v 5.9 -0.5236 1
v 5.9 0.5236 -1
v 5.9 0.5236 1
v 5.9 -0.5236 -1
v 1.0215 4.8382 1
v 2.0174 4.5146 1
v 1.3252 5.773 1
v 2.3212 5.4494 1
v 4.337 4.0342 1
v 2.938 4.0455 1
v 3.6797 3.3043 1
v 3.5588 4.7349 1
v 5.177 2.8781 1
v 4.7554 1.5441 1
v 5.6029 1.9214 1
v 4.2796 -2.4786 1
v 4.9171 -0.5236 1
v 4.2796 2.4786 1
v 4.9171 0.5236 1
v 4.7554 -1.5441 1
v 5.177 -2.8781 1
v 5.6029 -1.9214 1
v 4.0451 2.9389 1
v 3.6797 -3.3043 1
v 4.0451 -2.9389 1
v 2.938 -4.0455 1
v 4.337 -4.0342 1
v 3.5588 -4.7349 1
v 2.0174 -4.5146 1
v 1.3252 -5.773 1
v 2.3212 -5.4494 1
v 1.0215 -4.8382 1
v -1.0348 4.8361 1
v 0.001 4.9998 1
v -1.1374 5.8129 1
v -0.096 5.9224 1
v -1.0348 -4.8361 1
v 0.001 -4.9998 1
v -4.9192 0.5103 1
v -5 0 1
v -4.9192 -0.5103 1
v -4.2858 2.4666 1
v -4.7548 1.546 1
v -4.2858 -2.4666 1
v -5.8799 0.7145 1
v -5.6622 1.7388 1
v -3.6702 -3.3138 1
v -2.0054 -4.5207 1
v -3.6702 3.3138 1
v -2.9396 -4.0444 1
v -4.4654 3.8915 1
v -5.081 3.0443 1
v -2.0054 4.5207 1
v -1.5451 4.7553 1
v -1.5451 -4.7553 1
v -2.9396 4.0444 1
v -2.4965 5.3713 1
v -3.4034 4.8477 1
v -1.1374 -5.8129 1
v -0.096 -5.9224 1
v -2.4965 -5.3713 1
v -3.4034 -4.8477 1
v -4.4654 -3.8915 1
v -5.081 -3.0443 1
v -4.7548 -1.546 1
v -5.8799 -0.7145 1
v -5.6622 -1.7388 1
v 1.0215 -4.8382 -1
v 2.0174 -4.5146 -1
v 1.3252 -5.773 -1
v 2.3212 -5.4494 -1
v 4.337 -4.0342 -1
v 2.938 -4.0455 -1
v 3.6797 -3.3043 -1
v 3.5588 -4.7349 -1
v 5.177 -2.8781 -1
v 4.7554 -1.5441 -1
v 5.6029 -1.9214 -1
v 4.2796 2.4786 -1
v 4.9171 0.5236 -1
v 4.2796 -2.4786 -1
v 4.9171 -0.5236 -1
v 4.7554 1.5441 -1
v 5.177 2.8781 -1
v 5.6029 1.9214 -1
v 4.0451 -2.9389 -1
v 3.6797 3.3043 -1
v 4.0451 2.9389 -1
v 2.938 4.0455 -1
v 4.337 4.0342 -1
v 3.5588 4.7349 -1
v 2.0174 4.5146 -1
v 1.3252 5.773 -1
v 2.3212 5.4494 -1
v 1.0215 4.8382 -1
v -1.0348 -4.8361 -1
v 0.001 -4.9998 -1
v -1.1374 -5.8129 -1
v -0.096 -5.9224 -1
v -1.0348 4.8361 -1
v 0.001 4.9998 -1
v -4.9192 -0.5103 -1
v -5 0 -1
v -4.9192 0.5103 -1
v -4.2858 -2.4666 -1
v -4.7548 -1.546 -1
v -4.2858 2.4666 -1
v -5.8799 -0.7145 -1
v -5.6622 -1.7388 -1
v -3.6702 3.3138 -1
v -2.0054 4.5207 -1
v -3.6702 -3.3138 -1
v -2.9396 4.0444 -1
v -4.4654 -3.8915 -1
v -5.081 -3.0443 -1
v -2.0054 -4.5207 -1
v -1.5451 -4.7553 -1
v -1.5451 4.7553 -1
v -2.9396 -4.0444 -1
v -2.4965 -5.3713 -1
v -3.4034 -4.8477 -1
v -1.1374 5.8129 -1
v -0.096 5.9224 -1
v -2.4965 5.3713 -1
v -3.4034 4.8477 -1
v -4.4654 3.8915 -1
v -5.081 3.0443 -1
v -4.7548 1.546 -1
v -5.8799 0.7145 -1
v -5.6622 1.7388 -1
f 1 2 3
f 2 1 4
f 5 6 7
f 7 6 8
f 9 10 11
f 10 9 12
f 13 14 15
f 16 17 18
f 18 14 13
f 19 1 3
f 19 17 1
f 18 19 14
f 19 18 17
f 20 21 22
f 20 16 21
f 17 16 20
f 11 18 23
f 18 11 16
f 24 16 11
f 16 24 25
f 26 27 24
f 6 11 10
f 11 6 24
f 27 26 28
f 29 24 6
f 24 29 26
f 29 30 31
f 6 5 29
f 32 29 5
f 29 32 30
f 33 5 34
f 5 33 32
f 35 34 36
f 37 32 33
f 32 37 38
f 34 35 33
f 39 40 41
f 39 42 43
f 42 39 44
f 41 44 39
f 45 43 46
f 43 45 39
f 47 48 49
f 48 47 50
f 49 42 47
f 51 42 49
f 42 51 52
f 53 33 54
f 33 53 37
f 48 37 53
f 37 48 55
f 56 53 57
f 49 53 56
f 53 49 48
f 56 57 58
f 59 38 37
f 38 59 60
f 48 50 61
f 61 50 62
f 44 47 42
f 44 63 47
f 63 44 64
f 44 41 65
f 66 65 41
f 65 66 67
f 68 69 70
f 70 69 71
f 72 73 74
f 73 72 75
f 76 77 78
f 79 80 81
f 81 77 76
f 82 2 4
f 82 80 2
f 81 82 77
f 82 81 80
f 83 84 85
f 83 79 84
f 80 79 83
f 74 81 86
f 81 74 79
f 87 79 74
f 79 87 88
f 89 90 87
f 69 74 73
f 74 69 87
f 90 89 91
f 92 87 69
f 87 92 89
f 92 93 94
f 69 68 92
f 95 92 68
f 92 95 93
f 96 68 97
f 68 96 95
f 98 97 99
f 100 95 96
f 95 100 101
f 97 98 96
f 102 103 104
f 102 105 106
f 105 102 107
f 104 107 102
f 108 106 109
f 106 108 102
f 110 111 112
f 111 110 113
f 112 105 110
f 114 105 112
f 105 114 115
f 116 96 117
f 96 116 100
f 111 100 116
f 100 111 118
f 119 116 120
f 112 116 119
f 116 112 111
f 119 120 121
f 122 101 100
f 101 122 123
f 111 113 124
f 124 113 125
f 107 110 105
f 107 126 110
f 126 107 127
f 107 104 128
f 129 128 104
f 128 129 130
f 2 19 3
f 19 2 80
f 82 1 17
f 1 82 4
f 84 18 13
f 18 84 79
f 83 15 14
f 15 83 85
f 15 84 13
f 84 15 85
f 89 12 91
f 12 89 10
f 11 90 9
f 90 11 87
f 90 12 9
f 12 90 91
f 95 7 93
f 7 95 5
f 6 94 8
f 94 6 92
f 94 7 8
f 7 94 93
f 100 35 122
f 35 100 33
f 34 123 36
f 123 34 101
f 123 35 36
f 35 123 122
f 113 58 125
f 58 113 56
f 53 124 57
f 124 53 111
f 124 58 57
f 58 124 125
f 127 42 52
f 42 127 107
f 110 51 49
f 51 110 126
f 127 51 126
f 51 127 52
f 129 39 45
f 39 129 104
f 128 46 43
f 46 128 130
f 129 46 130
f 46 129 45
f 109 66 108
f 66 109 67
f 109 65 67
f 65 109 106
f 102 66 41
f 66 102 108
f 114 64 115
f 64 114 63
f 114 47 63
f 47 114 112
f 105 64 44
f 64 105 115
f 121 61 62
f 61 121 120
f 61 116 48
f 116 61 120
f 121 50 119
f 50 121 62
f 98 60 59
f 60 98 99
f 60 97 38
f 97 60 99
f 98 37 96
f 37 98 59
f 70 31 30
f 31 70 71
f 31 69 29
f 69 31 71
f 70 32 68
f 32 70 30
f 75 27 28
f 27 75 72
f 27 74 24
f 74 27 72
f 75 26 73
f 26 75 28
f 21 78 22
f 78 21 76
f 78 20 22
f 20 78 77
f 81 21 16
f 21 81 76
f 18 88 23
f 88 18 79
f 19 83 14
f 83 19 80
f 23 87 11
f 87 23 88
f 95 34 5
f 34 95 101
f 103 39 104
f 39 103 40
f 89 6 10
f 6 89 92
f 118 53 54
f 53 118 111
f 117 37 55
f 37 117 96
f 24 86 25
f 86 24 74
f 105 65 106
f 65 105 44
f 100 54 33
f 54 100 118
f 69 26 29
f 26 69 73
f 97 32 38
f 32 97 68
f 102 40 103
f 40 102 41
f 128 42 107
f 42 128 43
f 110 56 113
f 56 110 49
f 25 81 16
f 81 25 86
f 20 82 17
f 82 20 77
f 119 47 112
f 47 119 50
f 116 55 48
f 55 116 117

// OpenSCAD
	
	radius = 5;
	numTeeth = 15;
	toothDepth = 1;

	width = 3.141592 * radius / numTeeth;

	cylinder(h = 2, r=radius, $fn=20, center=true);

	for(i= [0 : numTeeth]){
		
		rotate([0,0,(i/numTeeth)*360]){
			
			translate([radius + toothDepth/2 - 0.1 ,0,0]){
		
				cube([toothDepth,width,2],center=true);
			}
		}
	}
